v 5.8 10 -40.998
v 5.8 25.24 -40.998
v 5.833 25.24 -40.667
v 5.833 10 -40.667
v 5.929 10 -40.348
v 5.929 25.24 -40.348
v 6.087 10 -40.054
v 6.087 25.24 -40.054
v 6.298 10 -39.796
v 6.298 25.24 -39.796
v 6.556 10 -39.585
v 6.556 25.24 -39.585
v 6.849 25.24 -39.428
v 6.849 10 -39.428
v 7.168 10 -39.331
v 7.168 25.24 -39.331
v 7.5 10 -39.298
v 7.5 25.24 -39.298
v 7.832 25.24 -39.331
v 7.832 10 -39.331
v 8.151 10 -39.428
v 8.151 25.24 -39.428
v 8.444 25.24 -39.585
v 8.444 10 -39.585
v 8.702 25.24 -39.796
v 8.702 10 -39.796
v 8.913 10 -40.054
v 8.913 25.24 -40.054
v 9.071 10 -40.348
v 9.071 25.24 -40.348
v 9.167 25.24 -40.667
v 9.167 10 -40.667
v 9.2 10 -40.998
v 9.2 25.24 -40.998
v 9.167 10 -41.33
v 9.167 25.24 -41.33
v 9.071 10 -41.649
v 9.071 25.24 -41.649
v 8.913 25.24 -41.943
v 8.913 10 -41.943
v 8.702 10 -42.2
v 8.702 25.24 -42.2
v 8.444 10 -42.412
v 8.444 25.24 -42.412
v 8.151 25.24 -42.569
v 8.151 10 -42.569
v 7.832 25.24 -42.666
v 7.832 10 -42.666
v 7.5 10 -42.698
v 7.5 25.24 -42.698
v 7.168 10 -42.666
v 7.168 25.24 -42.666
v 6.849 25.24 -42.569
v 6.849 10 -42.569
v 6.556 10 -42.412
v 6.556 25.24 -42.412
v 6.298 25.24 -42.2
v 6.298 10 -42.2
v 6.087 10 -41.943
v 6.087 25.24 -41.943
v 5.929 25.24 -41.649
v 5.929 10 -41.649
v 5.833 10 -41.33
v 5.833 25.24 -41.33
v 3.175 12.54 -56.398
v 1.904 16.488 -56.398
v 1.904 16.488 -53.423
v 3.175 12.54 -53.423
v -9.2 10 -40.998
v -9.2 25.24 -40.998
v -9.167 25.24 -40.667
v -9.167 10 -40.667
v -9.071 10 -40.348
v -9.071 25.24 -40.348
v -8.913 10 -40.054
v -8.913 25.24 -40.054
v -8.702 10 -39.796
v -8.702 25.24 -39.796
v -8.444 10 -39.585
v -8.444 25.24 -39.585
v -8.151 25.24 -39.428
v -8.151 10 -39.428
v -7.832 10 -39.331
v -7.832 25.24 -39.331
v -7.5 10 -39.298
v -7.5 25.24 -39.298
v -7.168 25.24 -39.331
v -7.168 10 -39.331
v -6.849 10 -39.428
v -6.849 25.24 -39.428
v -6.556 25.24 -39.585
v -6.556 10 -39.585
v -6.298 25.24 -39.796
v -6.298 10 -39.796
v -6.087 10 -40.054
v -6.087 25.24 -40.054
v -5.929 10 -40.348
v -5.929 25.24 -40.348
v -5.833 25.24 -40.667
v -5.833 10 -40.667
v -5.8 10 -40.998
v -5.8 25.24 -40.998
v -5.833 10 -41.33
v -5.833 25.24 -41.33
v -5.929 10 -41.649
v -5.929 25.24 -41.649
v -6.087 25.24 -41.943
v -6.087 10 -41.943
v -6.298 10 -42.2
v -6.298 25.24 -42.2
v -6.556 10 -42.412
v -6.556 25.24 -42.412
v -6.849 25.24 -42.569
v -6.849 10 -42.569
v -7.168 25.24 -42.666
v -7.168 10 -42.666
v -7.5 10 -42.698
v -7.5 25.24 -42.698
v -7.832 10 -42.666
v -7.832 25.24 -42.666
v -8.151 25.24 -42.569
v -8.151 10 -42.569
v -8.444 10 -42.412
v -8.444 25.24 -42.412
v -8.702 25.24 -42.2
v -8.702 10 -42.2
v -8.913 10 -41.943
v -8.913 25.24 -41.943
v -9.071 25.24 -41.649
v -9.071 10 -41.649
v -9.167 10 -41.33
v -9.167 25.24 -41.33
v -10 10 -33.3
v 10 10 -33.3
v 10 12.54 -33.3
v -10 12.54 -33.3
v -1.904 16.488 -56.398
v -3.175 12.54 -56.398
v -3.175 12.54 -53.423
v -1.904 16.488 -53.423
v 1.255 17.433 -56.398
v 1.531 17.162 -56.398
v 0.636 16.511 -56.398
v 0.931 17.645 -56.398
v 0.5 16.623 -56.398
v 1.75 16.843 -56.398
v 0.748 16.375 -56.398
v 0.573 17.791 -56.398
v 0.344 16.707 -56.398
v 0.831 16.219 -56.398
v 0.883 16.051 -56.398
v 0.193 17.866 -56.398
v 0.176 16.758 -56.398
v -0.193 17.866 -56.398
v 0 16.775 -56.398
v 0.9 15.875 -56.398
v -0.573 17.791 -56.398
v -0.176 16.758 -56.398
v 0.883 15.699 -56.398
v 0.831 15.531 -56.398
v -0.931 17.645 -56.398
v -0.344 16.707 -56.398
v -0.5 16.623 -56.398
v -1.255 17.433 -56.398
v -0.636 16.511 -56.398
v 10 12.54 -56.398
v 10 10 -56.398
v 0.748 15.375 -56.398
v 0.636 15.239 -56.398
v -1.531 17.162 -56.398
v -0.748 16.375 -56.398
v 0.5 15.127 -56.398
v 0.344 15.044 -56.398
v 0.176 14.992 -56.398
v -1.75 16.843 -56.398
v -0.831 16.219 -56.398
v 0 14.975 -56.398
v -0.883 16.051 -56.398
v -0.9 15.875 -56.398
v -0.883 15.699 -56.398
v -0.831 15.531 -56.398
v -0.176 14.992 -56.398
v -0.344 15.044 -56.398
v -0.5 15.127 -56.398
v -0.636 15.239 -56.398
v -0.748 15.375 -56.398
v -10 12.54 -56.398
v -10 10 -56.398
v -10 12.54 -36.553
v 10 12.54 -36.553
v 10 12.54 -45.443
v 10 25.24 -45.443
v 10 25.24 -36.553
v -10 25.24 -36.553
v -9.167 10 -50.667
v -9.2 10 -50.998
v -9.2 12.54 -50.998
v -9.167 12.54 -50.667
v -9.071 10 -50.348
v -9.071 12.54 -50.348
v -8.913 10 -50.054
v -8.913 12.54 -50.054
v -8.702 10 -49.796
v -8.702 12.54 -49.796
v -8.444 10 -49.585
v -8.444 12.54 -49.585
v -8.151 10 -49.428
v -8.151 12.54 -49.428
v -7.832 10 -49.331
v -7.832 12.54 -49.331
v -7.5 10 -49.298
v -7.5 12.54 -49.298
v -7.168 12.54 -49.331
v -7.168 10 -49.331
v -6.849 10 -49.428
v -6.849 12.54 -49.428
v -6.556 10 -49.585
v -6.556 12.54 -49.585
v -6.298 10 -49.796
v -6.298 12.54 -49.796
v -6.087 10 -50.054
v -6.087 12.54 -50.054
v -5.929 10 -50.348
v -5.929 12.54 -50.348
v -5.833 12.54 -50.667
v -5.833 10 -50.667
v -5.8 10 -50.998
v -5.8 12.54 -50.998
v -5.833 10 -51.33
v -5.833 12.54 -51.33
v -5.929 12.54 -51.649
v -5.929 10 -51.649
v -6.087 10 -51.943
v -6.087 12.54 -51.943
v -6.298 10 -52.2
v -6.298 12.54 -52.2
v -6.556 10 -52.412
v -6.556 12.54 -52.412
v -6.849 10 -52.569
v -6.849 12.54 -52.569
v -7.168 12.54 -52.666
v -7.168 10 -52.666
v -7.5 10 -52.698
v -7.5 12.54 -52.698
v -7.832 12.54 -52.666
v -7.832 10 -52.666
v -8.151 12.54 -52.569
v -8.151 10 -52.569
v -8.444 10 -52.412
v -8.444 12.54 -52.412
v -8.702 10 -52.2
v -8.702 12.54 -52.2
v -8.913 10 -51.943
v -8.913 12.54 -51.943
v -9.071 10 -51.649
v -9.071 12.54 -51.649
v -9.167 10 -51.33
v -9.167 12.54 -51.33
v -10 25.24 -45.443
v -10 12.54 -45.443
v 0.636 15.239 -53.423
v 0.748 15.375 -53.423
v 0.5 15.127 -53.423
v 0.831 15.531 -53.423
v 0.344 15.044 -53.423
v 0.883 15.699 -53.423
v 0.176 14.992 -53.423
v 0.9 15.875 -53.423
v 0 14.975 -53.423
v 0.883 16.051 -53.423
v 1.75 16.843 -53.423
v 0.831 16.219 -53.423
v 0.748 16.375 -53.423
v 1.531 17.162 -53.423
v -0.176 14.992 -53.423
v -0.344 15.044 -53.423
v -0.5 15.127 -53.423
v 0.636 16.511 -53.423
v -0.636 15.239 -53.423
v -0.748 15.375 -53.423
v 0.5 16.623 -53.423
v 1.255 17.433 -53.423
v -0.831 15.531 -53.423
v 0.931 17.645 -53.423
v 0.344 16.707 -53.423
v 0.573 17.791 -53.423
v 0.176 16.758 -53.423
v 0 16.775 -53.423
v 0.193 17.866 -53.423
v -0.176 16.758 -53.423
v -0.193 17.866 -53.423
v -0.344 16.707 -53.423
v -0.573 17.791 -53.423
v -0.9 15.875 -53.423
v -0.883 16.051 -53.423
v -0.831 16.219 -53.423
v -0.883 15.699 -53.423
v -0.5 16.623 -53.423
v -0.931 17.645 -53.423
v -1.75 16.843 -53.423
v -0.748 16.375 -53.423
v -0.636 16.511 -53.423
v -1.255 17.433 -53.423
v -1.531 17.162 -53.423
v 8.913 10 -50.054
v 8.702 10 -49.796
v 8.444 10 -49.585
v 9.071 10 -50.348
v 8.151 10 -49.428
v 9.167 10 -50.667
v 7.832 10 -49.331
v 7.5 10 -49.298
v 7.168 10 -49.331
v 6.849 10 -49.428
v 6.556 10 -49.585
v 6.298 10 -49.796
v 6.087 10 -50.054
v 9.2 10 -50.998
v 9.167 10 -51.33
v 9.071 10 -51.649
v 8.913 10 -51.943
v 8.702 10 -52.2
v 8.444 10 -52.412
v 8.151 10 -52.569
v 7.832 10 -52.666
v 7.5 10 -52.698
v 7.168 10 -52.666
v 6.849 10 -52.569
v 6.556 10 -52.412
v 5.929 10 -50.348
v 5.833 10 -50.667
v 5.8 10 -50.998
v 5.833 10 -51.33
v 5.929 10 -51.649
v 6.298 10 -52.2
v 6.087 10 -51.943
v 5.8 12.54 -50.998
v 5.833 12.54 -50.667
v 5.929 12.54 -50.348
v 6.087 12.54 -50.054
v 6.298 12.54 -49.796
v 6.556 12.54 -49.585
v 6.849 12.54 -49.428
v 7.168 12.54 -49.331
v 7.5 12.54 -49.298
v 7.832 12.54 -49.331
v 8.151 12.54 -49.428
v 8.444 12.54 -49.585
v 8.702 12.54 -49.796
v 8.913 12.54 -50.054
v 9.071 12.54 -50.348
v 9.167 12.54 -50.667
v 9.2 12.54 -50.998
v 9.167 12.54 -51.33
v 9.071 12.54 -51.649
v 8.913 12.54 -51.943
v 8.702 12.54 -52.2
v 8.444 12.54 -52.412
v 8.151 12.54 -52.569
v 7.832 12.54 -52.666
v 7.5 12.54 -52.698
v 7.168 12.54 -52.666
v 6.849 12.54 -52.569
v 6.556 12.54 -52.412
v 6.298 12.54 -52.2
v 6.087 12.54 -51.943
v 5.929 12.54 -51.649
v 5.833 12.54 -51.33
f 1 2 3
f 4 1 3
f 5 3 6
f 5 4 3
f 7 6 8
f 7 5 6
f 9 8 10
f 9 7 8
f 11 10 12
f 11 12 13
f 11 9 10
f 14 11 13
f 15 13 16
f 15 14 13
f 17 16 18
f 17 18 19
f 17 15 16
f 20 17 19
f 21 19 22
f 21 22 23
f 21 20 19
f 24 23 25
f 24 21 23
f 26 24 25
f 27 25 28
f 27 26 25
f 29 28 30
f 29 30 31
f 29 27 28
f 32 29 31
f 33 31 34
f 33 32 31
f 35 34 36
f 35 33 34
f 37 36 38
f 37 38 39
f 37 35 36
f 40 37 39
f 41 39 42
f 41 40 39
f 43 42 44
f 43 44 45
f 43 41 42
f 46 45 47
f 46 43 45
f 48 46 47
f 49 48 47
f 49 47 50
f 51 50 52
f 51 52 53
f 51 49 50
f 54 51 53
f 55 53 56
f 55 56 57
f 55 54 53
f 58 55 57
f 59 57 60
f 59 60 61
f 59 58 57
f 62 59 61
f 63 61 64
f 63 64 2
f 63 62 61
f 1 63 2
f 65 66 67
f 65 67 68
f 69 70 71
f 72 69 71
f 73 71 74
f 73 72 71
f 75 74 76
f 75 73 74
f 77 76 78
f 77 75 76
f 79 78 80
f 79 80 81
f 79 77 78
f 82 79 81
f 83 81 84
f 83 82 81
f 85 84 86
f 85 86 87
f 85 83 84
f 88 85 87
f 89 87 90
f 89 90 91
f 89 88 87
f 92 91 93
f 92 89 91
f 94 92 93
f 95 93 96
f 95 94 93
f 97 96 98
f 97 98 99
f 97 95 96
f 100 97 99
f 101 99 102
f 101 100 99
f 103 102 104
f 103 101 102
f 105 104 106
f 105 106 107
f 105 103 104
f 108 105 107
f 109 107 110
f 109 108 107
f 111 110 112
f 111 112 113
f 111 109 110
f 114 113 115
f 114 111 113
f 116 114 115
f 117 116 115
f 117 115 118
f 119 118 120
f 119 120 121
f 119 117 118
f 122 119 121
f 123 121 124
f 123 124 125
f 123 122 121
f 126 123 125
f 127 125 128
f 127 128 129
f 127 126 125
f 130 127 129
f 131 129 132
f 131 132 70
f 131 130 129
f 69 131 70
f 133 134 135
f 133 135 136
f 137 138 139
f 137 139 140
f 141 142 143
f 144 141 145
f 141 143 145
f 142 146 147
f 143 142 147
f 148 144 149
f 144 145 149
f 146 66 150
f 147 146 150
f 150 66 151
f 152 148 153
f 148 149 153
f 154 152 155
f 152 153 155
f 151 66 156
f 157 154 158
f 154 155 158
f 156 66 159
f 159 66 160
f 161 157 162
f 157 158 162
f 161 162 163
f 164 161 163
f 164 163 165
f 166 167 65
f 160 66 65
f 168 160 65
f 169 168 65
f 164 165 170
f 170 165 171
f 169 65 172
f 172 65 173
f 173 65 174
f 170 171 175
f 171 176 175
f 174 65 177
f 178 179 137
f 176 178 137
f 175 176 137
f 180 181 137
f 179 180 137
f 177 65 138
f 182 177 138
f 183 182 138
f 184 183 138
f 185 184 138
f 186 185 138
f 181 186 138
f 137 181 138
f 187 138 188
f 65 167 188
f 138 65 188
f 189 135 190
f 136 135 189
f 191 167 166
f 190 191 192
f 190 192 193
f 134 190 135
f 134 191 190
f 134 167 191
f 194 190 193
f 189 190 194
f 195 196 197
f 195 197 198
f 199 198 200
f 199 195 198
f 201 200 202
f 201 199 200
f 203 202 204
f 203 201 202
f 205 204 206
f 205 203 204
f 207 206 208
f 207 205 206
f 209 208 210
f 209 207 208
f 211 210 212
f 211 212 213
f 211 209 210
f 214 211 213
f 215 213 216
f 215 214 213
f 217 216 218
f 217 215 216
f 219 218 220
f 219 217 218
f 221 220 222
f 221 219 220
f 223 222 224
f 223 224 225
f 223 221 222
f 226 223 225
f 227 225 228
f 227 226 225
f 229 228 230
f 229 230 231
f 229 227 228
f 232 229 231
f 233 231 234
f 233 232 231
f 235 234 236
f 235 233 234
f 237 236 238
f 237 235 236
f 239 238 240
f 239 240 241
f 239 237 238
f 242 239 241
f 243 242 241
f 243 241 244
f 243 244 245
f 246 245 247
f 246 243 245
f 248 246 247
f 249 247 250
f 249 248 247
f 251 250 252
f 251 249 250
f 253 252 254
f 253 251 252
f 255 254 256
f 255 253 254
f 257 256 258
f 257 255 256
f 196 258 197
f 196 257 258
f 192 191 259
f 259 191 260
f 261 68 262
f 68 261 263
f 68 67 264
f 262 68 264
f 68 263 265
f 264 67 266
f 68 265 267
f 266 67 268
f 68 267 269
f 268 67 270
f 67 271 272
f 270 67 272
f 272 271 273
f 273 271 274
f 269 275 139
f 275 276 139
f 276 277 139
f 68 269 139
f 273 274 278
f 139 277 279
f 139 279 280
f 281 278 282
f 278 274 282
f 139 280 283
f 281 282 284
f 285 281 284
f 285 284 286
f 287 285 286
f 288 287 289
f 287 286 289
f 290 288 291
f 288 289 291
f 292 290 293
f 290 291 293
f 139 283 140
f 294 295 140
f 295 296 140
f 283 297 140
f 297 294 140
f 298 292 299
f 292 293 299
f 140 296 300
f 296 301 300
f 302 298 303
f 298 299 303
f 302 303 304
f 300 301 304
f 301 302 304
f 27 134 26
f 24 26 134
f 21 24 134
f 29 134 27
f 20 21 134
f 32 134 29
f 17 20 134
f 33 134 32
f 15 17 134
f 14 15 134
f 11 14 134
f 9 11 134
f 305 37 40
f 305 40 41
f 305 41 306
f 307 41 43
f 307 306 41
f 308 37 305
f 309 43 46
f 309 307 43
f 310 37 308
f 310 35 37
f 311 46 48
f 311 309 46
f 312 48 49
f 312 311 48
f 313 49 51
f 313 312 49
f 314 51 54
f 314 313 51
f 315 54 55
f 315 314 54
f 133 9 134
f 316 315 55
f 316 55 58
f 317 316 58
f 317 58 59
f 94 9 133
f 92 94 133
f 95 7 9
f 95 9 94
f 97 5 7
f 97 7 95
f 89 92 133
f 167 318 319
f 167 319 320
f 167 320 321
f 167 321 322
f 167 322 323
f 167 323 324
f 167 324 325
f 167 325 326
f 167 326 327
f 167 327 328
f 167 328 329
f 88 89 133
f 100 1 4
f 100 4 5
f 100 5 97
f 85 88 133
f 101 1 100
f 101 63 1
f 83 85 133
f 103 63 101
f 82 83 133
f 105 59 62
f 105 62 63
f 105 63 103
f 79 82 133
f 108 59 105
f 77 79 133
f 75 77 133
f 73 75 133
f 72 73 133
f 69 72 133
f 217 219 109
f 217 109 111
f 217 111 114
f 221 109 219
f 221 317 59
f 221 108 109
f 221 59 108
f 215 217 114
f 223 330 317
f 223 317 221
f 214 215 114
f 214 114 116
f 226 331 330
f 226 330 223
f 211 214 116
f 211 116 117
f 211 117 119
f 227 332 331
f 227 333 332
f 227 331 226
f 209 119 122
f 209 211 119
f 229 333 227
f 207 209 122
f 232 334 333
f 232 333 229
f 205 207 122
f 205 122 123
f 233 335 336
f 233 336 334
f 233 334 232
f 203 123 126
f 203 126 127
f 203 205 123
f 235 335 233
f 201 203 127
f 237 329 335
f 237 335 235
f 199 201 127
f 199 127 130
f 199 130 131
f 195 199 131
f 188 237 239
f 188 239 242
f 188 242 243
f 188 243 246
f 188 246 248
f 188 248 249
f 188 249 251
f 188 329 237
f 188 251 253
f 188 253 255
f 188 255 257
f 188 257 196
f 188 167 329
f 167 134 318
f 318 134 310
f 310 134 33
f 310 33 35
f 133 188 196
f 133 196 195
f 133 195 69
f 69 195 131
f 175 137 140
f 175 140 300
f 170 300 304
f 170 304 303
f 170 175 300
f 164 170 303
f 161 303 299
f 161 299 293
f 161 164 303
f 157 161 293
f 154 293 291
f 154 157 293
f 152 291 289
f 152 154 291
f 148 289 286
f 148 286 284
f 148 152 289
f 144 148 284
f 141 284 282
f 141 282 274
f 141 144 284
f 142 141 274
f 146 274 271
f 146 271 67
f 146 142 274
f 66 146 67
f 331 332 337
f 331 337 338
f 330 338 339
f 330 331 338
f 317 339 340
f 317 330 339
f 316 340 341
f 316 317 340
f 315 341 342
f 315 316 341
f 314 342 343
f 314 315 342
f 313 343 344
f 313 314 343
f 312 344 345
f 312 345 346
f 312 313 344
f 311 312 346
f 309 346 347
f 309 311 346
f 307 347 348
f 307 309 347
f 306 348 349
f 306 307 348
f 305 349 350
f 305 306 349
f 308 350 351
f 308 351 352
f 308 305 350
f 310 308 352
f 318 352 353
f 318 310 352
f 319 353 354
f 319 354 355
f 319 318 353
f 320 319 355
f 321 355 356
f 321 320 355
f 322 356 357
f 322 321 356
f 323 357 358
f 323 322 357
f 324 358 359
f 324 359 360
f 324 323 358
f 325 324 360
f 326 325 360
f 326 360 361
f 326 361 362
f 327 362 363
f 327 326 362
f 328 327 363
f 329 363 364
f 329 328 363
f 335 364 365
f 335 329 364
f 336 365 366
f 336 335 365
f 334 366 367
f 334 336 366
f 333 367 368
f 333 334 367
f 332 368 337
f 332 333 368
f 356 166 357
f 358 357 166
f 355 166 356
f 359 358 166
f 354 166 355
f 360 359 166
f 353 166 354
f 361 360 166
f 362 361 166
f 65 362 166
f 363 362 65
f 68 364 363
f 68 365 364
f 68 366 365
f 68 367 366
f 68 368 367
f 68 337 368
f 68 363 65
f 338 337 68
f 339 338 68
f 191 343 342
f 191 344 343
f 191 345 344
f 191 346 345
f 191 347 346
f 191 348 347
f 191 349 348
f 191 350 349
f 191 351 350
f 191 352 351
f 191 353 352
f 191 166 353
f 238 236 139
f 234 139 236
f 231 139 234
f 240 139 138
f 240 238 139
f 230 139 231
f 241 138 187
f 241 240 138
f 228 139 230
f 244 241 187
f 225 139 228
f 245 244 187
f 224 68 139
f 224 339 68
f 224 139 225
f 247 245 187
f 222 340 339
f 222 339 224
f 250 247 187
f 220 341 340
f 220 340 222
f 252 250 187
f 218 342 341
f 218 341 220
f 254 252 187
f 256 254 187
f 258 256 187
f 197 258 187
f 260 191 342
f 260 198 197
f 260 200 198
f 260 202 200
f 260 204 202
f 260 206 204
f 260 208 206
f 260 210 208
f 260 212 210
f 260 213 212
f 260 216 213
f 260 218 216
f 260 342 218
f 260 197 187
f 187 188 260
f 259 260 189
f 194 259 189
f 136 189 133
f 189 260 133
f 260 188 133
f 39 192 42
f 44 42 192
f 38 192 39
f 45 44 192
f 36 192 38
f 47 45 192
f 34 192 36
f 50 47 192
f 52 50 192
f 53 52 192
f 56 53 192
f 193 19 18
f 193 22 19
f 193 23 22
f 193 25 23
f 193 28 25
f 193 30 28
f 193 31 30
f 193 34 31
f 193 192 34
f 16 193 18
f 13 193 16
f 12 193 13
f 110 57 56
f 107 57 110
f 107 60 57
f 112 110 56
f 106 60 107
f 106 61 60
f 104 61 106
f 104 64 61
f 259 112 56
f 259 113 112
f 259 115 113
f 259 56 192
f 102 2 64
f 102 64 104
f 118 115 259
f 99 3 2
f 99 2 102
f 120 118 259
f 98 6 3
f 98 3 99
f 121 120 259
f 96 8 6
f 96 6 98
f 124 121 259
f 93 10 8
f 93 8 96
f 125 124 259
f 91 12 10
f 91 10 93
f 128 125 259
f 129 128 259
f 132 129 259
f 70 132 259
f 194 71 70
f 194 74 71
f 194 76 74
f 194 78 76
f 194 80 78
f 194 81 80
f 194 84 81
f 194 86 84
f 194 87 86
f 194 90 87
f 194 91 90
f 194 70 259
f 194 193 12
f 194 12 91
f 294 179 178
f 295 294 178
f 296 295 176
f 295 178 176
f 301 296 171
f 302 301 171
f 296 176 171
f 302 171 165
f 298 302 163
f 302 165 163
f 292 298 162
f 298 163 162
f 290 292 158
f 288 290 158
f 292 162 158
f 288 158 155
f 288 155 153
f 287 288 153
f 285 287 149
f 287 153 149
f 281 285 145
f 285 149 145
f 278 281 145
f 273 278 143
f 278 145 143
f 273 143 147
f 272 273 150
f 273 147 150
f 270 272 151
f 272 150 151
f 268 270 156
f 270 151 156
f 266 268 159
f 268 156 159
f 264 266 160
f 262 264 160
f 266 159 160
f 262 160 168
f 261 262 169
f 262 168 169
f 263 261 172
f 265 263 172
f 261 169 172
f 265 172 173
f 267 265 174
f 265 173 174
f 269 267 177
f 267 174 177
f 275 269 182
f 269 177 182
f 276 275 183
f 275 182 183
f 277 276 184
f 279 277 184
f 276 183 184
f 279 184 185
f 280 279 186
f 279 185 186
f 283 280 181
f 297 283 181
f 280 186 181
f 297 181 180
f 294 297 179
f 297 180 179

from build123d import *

# Parameters (mm, degrees)
SKETCH036_W  = 19.99996
SKETCH036_H  = 23.09876
SKETCH036_R  = 1.7
PAD003_DEPTH = 2.54
SKETCH051_W  = 19.99996
SKETCH051_H  = 8.89
SKETCH051_R  = 1.7
PAD011_DEPTH = 12.7
SKETCH050_R  = 0.9
PAD012_DEPTH = 2.975


with BuildPart() as part:
    # Sketch036 → Pad003 (new body)
    with BuildSketch(Plane(origin=(0, 10, -45.999574), x_dir=(-1, 0, 0), z_dir=(0, 1, 0))):
        with Locations((0, 1.15062)):
            Rectangle(SKETCH036_W, SKETCH036_H)
        with Locations((-7.5, 5.00124)):
            Circle(SKETCH036_R, mode=Mode.SUBTRACT)
        with Locations((-7.5, -4.99876)):
            Circle(SKETCH036_R, mode=Mode.SUBTRACT)
        with Locations((7.5, -4.99876)):
            Circle(SKETCH036_R, mode=Mode.SUBTRACT)
        with Locations((7.5, 5.00124)):
            Circle(SKETCH036_R, mode=Mode.SUBTRACT)
    extrude(amount=PAD003_DEPTH)

    # Sketch051 (on Face10 of Pad003) → Pad011 (join)
    with BuildSketch(Plane(origin=(0, 12.54, -45.999574), x_dir=(-1, 0, 0), z_dir=(0, 1, 0))):
        with Locations((0, 5.00124)):
            Rectangle(SKETCH051_W, SKETCH051_H)
        with Locations((-7.5, 5.00124)):
            Circle(SKETCH051_R, mode=Mode.SUBTRACT)
        with Locations((7.5, 5.00124)):
            Circle(SKETCH051_R, mode=Mode.SUBTRACT)
    extrude(amount=PAD011_DEPTH)

    # Sketch050 → Pad012 (join)
    with BuildSketch(Plane(origin=(0, 10, -56.398334), x_dir=(-1, 0, 0), z_dir=(0, 0, -1))):
        with BuildLine():
            Line((-3.175, 2.54), (-3.175, 0))
            Line((-3.175, 0), (3.175, 0))
            Line((3.175, 0), (3.175, 2.54))
            Line((3.175, 2.54), (1.90374, 6.488023))
            ThreePointArc((1.90374, 6.488023), (0, 7.87502), (-1.90374, 6.488023))
            Line((-1.90374, 6.488023), (-3.175, 2.54))
        make_face()
        with Locations((0, 5.87502)):
            Circle(SKETCH050_R, mode=Mode.SUBTRACT)
    extrude(amount=-PAD012_DEPTH)


solid = part.part
